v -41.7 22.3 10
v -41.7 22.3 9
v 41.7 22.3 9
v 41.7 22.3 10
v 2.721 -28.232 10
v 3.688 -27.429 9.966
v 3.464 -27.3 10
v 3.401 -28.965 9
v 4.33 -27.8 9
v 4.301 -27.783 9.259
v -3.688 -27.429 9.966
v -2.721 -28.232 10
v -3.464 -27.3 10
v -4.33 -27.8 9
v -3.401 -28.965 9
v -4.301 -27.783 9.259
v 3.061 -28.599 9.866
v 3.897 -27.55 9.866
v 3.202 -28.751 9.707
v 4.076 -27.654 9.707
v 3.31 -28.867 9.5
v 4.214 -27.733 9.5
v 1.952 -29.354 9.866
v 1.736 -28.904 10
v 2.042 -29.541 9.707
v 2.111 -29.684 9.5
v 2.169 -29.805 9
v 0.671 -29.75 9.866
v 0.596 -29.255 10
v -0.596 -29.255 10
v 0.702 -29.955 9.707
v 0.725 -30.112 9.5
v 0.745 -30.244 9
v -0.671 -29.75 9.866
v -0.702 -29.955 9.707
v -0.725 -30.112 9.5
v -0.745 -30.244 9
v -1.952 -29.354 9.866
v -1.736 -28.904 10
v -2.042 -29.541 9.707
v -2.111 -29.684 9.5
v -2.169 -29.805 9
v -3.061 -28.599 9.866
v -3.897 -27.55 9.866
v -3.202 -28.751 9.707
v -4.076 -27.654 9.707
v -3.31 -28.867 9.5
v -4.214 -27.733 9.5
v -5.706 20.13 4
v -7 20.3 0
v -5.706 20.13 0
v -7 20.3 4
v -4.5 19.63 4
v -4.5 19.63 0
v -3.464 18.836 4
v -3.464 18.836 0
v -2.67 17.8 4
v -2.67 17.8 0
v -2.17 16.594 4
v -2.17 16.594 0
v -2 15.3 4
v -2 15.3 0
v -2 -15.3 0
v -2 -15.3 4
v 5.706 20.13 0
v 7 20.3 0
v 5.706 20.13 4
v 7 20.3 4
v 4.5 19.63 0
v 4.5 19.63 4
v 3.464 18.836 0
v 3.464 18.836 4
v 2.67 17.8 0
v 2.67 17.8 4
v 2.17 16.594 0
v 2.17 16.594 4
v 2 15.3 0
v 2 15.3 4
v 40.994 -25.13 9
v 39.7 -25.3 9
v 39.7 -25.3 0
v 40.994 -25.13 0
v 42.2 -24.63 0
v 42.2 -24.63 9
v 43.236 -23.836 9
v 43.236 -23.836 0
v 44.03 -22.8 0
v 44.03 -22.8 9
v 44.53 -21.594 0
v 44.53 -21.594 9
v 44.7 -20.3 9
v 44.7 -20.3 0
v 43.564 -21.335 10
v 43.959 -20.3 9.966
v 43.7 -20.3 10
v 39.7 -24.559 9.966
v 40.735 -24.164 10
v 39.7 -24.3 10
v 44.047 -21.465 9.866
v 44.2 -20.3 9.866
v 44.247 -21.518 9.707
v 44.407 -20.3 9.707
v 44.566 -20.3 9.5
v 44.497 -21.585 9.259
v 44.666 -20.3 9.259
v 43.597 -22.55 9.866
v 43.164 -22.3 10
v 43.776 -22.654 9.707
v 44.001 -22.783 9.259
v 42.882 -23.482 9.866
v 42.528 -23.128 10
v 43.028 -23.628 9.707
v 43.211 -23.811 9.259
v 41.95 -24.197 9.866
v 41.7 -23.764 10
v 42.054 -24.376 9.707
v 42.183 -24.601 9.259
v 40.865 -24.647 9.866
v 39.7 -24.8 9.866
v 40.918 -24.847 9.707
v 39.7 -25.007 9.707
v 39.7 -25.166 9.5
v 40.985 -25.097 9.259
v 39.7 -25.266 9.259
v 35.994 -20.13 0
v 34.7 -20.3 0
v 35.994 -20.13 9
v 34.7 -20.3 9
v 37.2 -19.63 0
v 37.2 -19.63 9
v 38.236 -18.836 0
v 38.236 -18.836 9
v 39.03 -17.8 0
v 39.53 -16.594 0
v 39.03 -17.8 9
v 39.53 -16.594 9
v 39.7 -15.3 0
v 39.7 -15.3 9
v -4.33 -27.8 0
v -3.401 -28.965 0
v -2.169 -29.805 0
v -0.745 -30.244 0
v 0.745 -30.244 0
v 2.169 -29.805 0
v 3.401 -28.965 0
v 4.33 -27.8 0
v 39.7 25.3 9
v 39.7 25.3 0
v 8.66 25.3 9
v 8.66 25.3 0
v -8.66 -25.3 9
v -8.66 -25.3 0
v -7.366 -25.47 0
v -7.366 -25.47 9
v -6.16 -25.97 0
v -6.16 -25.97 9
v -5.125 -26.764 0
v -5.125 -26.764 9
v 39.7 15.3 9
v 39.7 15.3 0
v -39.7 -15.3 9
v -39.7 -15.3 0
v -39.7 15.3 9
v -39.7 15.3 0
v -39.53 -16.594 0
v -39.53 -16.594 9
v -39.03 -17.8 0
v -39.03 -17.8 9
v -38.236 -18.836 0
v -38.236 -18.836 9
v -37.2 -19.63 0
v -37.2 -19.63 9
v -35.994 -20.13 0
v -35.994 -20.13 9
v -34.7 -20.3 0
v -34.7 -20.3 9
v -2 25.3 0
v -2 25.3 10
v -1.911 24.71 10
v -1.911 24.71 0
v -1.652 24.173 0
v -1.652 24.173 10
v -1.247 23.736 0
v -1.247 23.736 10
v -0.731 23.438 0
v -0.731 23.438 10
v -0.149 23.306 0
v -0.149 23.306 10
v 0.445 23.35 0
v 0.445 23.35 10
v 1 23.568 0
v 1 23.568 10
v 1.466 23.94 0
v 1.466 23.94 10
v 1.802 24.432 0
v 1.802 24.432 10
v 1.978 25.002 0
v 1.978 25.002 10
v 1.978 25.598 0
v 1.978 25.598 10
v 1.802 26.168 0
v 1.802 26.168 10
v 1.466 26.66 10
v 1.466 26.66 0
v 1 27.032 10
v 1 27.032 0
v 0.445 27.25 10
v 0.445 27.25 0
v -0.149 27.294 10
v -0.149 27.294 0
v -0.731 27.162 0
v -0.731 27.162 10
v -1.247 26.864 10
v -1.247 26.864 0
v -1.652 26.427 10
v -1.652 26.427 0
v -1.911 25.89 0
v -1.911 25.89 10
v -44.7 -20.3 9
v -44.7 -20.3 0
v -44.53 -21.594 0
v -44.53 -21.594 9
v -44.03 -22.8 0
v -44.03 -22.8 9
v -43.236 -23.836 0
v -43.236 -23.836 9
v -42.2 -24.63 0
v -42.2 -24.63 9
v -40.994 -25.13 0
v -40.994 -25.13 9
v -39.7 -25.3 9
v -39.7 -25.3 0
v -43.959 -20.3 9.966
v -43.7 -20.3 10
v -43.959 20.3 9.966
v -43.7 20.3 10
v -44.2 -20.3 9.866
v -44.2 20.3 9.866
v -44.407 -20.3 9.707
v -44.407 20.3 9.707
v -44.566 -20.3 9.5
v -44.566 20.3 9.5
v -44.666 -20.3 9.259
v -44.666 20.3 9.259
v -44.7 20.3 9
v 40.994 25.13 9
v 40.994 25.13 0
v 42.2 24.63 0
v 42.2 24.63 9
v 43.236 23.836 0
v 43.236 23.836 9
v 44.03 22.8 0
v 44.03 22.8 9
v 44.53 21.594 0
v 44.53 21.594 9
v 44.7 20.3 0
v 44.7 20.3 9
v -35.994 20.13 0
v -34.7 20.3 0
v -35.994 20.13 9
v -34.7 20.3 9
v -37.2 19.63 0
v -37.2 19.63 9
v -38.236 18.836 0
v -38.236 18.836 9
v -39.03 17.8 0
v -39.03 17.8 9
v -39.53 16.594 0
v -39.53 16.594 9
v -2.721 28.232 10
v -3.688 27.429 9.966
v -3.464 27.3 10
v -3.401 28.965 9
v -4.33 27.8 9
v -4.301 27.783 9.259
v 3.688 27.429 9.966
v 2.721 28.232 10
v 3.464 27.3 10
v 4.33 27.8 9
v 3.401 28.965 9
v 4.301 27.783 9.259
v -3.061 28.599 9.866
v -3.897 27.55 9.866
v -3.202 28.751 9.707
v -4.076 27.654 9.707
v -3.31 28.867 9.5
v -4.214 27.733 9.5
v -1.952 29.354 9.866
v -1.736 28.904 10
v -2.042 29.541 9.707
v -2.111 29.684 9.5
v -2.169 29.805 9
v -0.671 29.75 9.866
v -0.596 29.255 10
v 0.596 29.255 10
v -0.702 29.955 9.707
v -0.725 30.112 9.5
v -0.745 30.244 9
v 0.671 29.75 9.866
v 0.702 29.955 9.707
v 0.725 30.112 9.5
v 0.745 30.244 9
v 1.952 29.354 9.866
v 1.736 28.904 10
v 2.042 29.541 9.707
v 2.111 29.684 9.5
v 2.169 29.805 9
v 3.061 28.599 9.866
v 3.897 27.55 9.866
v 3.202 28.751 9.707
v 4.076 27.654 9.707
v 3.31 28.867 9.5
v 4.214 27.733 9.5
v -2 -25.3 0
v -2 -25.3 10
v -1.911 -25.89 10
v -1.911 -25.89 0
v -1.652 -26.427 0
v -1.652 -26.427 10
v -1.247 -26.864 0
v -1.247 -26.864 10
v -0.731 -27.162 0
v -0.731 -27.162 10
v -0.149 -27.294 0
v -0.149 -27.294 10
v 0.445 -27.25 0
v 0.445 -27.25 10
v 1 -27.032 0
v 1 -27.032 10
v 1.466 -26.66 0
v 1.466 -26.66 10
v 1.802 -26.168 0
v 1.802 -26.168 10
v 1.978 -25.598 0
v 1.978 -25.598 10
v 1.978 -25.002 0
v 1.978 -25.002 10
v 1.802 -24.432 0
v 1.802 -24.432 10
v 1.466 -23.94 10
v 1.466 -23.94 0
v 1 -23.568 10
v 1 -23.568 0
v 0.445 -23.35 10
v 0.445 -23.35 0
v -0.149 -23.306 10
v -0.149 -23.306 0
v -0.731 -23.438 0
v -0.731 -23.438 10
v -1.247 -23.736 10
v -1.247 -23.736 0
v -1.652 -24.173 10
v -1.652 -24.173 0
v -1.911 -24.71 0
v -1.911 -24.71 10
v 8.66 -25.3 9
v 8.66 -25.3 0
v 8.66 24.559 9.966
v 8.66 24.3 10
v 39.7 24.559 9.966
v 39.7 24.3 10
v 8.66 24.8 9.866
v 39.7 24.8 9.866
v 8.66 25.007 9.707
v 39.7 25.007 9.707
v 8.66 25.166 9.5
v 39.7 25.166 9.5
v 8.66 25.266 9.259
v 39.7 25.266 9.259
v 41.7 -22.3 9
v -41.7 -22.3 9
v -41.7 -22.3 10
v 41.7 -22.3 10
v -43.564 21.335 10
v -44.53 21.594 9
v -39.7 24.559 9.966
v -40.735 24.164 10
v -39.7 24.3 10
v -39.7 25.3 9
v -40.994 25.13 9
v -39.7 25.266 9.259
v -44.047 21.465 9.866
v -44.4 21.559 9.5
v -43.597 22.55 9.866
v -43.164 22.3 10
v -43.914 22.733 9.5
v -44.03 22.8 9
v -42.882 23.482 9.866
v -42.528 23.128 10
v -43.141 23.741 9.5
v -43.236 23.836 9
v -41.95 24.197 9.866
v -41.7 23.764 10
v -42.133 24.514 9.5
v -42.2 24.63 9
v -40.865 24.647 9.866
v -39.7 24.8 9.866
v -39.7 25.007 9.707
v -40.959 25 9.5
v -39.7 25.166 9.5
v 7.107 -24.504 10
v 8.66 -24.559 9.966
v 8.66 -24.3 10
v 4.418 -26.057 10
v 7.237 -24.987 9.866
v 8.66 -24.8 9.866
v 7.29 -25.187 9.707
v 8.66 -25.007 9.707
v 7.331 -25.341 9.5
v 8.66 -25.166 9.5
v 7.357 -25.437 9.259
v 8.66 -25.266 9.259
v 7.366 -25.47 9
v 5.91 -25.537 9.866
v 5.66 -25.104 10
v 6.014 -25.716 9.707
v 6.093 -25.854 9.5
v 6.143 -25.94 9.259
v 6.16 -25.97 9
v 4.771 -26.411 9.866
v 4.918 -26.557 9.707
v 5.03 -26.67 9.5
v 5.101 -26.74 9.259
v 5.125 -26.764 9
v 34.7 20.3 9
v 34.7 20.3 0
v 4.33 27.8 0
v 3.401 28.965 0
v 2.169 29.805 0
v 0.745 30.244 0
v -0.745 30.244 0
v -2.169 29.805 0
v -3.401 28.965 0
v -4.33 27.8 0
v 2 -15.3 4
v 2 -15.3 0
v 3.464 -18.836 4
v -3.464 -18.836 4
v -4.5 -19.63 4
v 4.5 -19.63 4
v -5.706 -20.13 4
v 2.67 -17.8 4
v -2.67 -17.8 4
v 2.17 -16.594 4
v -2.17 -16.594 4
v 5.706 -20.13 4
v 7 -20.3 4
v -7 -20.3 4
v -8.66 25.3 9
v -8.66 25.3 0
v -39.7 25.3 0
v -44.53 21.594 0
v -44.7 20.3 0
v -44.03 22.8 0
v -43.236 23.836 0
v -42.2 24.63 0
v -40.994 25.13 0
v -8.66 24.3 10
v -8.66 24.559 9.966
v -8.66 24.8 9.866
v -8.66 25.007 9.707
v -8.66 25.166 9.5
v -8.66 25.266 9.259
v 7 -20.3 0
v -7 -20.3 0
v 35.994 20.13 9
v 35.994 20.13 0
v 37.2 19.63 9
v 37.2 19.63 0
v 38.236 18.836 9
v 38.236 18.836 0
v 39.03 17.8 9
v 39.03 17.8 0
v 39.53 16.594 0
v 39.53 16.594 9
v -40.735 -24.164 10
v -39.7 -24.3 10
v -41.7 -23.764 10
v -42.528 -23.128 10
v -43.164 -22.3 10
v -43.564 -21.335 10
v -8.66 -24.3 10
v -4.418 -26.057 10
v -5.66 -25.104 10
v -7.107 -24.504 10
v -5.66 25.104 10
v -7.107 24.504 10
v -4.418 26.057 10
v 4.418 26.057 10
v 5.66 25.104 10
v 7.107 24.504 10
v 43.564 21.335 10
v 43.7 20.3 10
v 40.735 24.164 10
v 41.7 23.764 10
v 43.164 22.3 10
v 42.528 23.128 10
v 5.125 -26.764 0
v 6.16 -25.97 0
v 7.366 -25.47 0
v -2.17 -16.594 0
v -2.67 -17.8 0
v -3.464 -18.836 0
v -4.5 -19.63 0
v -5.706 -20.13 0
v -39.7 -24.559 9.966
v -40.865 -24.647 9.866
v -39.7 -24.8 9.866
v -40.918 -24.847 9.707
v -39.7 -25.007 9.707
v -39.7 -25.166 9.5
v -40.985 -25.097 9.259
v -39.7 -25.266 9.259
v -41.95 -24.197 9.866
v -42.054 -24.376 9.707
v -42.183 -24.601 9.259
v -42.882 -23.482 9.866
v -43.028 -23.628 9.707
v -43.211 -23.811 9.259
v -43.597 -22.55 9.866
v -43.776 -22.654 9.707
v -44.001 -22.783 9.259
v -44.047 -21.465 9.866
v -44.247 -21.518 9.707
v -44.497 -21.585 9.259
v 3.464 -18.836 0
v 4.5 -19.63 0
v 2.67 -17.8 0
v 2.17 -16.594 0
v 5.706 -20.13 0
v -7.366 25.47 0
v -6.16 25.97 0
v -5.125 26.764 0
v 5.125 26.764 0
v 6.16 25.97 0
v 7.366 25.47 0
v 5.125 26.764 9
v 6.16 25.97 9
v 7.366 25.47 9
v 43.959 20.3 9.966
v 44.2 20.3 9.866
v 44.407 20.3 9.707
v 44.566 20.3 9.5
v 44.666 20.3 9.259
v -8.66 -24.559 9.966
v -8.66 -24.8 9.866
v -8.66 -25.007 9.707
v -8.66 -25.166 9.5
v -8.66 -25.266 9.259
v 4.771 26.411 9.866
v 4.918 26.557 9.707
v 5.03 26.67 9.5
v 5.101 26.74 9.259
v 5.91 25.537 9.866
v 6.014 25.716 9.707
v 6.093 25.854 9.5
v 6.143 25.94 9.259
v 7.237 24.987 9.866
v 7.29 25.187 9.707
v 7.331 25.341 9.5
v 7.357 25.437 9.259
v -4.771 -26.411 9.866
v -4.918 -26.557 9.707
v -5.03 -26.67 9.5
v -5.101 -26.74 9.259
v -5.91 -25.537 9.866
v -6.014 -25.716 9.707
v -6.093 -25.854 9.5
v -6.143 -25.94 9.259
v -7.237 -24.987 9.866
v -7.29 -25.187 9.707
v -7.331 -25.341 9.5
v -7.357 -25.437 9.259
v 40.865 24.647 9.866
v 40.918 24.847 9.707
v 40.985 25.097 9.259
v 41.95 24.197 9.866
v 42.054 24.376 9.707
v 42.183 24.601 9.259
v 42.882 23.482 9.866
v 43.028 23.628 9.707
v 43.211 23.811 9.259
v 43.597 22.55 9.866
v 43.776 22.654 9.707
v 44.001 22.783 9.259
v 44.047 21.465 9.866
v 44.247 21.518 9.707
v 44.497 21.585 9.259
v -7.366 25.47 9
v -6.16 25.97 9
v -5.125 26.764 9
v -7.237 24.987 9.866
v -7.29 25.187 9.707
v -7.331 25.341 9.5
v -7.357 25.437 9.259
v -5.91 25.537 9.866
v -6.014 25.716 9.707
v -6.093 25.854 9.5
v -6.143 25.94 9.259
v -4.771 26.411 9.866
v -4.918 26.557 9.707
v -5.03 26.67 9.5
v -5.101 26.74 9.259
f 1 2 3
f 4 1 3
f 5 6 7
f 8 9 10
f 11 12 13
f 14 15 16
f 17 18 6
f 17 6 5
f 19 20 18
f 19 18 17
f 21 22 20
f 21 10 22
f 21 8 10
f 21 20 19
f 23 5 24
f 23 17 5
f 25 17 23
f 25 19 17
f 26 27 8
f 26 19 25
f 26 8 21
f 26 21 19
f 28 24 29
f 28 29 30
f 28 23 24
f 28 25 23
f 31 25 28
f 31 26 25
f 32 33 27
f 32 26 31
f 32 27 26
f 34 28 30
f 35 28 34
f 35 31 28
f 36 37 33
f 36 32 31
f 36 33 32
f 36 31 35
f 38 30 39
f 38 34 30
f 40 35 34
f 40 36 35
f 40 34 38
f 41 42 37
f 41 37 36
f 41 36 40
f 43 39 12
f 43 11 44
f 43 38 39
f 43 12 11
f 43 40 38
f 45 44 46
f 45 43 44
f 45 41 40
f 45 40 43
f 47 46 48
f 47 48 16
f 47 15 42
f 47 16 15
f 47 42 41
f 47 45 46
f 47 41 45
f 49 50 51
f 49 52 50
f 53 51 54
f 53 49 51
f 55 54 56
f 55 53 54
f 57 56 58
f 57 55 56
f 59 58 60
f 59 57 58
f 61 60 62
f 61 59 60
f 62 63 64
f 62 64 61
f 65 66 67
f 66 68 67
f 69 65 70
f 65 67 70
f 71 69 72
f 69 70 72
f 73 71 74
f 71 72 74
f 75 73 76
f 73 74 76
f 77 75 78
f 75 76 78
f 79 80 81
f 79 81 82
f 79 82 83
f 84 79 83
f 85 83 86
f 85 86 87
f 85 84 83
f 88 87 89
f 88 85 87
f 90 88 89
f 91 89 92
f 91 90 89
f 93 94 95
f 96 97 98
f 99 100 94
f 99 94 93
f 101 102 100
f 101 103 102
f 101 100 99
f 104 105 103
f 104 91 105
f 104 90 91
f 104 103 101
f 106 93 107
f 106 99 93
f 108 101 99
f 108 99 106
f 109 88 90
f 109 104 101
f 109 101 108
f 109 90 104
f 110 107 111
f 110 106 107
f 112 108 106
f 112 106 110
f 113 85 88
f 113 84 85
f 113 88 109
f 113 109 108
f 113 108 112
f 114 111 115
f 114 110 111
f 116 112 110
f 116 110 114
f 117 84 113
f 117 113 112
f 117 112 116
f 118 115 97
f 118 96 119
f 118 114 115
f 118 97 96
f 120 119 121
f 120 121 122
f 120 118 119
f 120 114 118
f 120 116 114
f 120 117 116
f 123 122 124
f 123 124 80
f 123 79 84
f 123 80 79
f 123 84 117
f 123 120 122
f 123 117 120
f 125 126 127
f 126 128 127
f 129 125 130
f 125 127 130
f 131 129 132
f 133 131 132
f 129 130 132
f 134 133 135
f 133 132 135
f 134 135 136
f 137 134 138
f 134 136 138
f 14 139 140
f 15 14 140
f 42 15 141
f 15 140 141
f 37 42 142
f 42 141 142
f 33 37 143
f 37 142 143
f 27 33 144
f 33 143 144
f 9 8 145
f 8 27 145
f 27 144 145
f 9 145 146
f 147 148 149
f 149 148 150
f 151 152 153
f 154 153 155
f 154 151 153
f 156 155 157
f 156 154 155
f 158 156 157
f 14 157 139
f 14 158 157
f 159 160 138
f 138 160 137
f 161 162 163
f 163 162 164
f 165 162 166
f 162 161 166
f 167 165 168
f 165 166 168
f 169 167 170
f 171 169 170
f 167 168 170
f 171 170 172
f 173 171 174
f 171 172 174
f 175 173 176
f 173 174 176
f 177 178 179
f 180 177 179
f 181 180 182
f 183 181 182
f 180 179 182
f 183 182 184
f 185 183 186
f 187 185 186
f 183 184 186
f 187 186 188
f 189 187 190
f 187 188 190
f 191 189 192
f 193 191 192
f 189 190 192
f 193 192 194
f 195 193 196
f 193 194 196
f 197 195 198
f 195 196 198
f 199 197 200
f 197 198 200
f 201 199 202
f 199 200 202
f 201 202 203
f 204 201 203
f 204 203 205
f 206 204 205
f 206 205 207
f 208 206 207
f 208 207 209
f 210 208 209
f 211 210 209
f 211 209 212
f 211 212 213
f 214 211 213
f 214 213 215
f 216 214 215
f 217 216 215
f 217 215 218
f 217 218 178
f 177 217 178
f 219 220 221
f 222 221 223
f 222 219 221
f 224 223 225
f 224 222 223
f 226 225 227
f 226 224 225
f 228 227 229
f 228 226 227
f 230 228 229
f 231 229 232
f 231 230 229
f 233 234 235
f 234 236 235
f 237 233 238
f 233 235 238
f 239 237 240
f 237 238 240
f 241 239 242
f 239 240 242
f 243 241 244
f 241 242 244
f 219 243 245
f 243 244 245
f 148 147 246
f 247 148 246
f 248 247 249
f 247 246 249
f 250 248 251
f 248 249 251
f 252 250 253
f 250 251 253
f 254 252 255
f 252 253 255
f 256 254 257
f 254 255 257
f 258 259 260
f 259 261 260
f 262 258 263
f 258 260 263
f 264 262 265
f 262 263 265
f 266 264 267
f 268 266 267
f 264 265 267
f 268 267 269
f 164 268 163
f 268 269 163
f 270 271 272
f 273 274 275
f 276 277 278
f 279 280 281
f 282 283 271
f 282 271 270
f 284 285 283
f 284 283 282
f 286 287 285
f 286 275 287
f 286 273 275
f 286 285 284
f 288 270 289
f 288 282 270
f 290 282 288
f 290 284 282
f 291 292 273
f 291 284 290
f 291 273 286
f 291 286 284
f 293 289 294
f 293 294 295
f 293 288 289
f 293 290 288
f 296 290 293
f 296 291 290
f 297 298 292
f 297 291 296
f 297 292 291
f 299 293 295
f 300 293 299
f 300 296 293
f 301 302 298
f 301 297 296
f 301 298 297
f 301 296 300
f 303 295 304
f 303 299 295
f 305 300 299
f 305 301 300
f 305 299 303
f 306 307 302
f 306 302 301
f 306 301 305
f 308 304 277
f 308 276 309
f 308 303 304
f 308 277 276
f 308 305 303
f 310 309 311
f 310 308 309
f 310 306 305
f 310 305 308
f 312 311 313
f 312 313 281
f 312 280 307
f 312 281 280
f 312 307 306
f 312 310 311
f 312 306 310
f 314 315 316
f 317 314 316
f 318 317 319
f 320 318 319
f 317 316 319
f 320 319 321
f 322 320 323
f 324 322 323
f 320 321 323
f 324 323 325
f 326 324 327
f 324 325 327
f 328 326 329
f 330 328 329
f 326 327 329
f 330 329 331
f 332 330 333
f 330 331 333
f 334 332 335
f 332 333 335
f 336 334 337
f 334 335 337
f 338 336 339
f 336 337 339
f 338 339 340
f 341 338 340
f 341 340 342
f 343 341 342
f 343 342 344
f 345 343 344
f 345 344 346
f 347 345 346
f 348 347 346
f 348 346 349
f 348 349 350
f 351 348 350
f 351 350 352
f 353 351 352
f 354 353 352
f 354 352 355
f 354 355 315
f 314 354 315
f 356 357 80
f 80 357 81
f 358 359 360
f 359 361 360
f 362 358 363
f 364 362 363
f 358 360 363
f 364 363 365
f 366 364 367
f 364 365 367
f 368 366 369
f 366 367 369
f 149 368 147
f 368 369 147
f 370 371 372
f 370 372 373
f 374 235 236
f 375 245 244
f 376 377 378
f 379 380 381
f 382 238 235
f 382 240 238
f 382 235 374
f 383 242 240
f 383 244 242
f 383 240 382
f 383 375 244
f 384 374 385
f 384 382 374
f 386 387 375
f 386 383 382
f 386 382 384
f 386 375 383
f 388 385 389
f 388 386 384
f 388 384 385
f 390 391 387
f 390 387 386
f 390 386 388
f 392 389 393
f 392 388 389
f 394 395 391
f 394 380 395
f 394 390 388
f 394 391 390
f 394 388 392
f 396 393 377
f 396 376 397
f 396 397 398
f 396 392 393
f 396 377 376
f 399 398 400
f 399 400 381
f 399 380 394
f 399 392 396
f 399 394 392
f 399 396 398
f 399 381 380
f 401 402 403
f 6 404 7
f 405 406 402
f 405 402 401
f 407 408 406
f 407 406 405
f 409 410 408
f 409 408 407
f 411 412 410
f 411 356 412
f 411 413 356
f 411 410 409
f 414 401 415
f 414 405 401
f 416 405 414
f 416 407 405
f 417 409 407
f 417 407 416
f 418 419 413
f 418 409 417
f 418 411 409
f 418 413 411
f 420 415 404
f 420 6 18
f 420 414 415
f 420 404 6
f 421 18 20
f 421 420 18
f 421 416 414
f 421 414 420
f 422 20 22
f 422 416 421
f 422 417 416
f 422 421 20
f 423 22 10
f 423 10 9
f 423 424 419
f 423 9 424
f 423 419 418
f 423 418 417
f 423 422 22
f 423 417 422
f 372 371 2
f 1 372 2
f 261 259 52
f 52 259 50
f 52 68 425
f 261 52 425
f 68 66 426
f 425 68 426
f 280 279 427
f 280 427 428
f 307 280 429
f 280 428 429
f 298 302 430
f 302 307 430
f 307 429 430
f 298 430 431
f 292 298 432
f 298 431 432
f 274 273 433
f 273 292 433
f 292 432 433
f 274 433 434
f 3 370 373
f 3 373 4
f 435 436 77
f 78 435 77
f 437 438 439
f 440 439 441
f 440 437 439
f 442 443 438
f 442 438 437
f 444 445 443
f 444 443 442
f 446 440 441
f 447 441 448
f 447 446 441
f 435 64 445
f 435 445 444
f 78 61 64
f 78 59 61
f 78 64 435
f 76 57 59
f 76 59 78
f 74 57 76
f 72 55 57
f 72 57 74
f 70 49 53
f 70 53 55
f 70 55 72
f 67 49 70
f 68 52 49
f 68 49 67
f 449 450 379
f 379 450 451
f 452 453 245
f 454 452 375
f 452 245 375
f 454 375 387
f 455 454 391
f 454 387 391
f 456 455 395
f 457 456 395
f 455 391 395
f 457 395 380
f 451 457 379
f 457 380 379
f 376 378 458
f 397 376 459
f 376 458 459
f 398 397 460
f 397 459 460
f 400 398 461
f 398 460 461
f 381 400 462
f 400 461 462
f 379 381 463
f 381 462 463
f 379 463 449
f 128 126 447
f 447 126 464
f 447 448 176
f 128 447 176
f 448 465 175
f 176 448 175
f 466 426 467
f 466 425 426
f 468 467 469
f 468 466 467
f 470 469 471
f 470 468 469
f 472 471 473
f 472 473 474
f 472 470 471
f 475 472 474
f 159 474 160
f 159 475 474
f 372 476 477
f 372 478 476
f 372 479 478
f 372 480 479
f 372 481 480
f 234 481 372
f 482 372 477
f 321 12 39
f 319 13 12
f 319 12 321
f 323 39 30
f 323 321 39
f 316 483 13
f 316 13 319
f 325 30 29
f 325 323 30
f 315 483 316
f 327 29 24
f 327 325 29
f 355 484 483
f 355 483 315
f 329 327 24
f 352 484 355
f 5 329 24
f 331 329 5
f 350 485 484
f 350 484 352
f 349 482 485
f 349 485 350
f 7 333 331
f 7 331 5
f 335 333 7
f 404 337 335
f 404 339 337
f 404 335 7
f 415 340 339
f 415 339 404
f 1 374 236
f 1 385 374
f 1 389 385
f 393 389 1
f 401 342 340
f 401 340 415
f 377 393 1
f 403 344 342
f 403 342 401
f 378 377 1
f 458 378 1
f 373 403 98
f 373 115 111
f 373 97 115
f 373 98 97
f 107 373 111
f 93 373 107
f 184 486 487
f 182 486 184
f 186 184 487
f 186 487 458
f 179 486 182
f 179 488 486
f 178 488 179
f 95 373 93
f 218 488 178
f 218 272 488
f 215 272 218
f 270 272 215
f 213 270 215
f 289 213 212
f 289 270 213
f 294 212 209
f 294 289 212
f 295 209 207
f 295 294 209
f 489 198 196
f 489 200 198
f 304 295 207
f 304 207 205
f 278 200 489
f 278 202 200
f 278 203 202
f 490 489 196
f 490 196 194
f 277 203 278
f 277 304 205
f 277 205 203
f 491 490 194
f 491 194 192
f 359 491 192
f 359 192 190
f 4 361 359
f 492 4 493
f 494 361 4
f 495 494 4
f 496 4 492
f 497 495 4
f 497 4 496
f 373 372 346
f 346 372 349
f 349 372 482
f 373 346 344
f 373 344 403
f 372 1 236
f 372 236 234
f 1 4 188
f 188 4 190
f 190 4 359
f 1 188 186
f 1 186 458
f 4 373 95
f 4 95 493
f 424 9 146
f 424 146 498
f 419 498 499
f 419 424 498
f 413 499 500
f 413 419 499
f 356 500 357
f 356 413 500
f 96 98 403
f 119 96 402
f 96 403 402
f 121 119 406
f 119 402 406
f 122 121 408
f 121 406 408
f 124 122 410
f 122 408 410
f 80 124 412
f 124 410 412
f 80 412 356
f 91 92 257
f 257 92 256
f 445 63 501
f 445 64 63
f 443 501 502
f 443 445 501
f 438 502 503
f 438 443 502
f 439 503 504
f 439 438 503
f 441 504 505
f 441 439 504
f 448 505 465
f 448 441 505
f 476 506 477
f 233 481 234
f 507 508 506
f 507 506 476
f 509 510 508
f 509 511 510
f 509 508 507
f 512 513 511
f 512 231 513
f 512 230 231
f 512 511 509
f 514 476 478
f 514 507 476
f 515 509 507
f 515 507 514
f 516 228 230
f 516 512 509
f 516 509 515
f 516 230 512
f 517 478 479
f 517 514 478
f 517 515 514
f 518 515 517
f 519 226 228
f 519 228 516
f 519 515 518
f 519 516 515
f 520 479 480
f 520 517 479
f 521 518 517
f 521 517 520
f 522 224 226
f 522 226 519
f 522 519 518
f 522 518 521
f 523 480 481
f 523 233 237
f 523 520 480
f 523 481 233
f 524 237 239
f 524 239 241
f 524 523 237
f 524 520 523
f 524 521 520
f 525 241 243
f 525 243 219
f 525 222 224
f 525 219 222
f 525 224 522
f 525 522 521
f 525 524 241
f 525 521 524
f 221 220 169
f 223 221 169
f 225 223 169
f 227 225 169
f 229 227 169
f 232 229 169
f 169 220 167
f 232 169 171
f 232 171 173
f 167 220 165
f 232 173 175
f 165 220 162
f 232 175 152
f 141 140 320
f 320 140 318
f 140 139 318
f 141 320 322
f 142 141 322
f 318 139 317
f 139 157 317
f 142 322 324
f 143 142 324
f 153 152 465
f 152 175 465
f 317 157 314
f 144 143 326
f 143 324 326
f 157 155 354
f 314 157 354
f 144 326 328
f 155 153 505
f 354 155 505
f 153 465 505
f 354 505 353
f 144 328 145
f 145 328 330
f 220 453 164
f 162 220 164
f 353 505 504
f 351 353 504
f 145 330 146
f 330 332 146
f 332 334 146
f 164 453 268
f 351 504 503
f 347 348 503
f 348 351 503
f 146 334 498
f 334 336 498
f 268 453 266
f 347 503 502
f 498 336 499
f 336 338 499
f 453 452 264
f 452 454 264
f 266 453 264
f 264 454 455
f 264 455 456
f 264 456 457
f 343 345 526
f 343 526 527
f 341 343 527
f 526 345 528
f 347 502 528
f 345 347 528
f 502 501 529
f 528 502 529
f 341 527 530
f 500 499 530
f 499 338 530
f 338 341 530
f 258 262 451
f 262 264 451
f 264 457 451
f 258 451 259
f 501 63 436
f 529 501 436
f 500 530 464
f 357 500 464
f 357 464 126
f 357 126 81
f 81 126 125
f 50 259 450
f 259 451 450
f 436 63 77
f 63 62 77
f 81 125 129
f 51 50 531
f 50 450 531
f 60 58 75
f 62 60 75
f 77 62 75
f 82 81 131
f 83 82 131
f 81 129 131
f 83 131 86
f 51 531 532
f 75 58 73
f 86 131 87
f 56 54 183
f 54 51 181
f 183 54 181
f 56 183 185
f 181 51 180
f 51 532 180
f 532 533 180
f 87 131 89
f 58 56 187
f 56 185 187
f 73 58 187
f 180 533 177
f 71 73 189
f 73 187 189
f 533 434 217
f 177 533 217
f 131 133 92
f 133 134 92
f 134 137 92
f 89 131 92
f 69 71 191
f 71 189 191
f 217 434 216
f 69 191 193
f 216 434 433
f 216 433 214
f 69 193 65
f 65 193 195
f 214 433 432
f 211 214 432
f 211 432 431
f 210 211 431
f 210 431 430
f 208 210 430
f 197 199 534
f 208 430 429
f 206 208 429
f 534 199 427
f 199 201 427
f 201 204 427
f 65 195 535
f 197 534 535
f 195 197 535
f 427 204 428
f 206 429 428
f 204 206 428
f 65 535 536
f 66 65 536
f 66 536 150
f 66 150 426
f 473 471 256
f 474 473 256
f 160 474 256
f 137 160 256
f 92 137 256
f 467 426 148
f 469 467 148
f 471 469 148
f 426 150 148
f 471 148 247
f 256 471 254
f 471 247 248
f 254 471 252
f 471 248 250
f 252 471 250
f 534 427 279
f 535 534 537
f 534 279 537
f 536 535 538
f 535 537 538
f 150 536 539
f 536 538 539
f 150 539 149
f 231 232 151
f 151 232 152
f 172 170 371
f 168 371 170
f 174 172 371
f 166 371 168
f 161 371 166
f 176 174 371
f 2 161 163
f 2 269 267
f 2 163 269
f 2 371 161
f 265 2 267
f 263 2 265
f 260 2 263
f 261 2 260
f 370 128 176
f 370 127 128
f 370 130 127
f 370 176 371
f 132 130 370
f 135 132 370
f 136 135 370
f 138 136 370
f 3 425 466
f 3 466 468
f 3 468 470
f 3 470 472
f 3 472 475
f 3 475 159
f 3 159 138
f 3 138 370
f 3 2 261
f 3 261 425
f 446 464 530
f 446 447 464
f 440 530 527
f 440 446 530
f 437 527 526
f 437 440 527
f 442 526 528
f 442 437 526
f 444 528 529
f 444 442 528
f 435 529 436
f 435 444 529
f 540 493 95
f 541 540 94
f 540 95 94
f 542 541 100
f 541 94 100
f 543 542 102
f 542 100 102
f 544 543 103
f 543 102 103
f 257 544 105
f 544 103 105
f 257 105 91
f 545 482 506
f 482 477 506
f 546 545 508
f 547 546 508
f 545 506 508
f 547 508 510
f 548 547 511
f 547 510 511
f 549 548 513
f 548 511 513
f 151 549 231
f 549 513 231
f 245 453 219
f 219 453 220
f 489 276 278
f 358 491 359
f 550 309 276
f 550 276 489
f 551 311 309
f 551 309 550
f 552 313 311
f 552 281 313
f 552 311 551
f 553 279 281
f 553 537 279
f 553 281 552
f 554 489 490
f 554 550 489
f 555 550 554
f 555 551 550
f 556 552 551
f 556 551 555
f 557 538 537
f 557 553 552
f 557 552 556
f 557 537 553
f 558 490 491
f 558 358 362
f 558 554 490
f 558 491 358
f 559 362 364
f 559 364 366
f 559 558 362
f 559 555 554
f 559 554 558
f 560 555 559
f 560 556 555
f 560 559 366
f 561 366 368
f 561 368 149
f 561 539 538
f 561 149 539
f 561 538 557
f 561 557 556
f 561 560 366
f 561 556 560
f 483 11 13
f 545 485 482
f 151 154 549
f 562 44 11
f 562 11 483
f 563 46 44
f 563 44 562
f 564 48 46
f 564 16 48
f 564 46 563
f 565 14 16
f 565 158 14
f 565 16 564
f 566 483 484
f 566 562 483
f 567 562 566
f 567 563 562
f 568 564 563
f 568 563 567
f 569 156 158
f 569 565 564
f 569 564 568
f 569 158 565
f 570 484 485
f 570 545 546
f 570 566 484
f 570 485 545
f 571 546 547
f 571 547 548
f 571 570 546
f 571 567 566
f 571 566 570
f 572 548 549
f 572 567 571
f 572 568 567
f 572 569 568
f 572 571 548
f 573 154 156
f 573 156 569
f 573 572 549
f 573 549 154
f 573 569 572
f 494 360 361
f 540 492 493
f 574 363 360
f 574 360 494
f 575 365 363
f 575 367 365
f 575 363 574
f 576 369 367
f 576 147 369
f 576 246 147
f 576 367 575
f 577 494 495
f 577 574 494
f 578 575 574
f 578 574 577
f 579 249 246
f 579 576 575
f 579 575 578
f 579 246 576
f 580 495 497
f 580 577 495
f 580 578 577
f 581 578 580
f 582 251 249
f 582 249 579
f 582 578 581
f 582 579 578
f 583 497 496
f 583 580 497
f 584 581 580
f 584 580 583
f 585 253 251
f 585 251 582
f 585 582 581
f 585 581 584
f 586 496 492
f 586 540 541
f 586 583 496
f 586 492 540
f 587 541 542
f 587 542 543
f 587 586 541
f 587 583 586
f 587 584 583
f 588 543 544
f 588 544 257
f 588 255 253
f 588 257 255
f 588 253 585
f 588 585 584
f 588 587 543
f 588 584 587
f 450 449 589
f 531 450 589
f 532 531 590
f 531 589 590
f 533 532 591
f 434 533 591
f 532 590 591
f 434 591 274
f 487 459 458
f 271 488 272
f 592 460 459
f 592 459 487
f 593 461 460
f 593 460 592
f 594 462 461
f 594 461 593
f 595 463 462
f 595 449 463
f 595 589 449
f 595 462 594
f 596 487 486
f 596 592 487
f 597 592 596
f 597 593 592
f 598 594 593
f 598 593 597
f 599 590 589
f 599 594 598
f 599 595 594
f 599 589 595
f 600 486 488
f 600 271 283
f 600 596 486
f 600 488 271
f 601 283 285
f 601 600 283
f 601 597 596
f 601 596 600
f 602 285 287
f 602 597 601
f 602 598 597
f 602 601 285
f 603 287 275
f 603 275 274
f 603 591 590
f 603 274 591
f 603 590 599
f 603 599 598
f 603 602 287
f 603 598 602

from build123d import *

# Parameters (mm, degrees)
F0_W     = 83.4
F0_H     = 44.6
F1_DEPTH = 9
F2_DEPTH = 10
F0_W_2   = 4
F0_H_2   = 40.6
F3_DEPTH = 4
F4_D     = 4
F4_DEPTH = 15
F4_TIP   = 1.2017212381
F5_R     = 5
F6_R     = 1


with BuildPart() as f1:
    # F0 (on Top) → F1 (new body)
    with BuildSketch(Plane.XY):
        Rectangle(F0_W, F0_H)
        Polygon((-39.7, -20.3), (-39.7, 20.3), (-2, 20.3), (2, 20.3), (39.7, 20.3), (39.7, -20.3), (2, -20.3), (-2, -20.3), align=None, mode=Mode.SUBTRACT)
    extrude(amount=F1_DEPTH)

    # F0 (on Top) → F2 (join)
    with BuildSketch(Plane.XY):
        Polygon((-5, 25.3), (-44.7, 25.3), (-44.7, -25.3), (-5, -25.3), (5, -25.3), (44.7, -25.3), (44.7, 25.3), (5, 25.3), align=None)
        Rectangle(F0_W, F0_H, mode=Mode.SUBTRACT)
        with BuildLine():
            Line((5, -25.3), (-5, -25.3))
            ThreePointArc((-5, -25.3), (0, -30.3), (5, -25.3))
        make_face()
        with BuildLine():
            ThreePointArc((5, 25.3), (0, 30.3), (-5, 25.3))
            Line((-5, 25.3), (5, 25.3))
        make_face()
    extrude(amount=F2_DEPTH)

    # F0 (on Top) → F3 (join)
    with BuildSketch(Plane.XY):
        Rectangle(F0_W_2, F0_H_2)
    extrude(amount=F3_DEPTH)

    # F4
    with Locations(Plane(origin=(0, 0, 0), x_dir=(1, 0, 0), z_dir=(0, 0, -1))):
        with Locations((0, -25.3), (0, 25.3)):
            Hole(F4_D / 2, depth=F4_DEPTH)
            with Locations((0, 0, -(F4_DEPTH + F4_TIP / 2))):  # 118° drill point
                Cone(0, F4_D / 2, F4_TIP, mode=Mode.SUBTRACT)

    # F5
    f5_edges = [f1.edges().sort_by_distance(p)[0] for p in [
        (-44.7, 25.3, 5),
        (-5, 25.3, 5),
        (5, 25.3, 5),
        (44.7, 25.3, 5),
        (44.7, -25.3, 5),
        (-5, -25.3, 5),
        (5, -25.3, 5),
        (-44.7, -25.3, 5),
        (2, 20.3, 2),
        (-2, 20.3, 2),
        (2, -20.3, 2),
        (-2, -20.3, 2),
        (39.7, 20.3, 4.5),
        (-39.7, 20.3, 4.5),
        (-39.7, -20.3, 4.5),
        (39.7, -20.3, 4.5),
    ]]
    fillet(f5_edges, radius=F5_R)

    # F6
    f6_edges = [f1.edges().sort_by_distance(p)[0] for p in [
        (-43.235534, 23.835534, 10),
    ]]
    fillet(f6_edges, radius=F6_R)


solid = f1.part
